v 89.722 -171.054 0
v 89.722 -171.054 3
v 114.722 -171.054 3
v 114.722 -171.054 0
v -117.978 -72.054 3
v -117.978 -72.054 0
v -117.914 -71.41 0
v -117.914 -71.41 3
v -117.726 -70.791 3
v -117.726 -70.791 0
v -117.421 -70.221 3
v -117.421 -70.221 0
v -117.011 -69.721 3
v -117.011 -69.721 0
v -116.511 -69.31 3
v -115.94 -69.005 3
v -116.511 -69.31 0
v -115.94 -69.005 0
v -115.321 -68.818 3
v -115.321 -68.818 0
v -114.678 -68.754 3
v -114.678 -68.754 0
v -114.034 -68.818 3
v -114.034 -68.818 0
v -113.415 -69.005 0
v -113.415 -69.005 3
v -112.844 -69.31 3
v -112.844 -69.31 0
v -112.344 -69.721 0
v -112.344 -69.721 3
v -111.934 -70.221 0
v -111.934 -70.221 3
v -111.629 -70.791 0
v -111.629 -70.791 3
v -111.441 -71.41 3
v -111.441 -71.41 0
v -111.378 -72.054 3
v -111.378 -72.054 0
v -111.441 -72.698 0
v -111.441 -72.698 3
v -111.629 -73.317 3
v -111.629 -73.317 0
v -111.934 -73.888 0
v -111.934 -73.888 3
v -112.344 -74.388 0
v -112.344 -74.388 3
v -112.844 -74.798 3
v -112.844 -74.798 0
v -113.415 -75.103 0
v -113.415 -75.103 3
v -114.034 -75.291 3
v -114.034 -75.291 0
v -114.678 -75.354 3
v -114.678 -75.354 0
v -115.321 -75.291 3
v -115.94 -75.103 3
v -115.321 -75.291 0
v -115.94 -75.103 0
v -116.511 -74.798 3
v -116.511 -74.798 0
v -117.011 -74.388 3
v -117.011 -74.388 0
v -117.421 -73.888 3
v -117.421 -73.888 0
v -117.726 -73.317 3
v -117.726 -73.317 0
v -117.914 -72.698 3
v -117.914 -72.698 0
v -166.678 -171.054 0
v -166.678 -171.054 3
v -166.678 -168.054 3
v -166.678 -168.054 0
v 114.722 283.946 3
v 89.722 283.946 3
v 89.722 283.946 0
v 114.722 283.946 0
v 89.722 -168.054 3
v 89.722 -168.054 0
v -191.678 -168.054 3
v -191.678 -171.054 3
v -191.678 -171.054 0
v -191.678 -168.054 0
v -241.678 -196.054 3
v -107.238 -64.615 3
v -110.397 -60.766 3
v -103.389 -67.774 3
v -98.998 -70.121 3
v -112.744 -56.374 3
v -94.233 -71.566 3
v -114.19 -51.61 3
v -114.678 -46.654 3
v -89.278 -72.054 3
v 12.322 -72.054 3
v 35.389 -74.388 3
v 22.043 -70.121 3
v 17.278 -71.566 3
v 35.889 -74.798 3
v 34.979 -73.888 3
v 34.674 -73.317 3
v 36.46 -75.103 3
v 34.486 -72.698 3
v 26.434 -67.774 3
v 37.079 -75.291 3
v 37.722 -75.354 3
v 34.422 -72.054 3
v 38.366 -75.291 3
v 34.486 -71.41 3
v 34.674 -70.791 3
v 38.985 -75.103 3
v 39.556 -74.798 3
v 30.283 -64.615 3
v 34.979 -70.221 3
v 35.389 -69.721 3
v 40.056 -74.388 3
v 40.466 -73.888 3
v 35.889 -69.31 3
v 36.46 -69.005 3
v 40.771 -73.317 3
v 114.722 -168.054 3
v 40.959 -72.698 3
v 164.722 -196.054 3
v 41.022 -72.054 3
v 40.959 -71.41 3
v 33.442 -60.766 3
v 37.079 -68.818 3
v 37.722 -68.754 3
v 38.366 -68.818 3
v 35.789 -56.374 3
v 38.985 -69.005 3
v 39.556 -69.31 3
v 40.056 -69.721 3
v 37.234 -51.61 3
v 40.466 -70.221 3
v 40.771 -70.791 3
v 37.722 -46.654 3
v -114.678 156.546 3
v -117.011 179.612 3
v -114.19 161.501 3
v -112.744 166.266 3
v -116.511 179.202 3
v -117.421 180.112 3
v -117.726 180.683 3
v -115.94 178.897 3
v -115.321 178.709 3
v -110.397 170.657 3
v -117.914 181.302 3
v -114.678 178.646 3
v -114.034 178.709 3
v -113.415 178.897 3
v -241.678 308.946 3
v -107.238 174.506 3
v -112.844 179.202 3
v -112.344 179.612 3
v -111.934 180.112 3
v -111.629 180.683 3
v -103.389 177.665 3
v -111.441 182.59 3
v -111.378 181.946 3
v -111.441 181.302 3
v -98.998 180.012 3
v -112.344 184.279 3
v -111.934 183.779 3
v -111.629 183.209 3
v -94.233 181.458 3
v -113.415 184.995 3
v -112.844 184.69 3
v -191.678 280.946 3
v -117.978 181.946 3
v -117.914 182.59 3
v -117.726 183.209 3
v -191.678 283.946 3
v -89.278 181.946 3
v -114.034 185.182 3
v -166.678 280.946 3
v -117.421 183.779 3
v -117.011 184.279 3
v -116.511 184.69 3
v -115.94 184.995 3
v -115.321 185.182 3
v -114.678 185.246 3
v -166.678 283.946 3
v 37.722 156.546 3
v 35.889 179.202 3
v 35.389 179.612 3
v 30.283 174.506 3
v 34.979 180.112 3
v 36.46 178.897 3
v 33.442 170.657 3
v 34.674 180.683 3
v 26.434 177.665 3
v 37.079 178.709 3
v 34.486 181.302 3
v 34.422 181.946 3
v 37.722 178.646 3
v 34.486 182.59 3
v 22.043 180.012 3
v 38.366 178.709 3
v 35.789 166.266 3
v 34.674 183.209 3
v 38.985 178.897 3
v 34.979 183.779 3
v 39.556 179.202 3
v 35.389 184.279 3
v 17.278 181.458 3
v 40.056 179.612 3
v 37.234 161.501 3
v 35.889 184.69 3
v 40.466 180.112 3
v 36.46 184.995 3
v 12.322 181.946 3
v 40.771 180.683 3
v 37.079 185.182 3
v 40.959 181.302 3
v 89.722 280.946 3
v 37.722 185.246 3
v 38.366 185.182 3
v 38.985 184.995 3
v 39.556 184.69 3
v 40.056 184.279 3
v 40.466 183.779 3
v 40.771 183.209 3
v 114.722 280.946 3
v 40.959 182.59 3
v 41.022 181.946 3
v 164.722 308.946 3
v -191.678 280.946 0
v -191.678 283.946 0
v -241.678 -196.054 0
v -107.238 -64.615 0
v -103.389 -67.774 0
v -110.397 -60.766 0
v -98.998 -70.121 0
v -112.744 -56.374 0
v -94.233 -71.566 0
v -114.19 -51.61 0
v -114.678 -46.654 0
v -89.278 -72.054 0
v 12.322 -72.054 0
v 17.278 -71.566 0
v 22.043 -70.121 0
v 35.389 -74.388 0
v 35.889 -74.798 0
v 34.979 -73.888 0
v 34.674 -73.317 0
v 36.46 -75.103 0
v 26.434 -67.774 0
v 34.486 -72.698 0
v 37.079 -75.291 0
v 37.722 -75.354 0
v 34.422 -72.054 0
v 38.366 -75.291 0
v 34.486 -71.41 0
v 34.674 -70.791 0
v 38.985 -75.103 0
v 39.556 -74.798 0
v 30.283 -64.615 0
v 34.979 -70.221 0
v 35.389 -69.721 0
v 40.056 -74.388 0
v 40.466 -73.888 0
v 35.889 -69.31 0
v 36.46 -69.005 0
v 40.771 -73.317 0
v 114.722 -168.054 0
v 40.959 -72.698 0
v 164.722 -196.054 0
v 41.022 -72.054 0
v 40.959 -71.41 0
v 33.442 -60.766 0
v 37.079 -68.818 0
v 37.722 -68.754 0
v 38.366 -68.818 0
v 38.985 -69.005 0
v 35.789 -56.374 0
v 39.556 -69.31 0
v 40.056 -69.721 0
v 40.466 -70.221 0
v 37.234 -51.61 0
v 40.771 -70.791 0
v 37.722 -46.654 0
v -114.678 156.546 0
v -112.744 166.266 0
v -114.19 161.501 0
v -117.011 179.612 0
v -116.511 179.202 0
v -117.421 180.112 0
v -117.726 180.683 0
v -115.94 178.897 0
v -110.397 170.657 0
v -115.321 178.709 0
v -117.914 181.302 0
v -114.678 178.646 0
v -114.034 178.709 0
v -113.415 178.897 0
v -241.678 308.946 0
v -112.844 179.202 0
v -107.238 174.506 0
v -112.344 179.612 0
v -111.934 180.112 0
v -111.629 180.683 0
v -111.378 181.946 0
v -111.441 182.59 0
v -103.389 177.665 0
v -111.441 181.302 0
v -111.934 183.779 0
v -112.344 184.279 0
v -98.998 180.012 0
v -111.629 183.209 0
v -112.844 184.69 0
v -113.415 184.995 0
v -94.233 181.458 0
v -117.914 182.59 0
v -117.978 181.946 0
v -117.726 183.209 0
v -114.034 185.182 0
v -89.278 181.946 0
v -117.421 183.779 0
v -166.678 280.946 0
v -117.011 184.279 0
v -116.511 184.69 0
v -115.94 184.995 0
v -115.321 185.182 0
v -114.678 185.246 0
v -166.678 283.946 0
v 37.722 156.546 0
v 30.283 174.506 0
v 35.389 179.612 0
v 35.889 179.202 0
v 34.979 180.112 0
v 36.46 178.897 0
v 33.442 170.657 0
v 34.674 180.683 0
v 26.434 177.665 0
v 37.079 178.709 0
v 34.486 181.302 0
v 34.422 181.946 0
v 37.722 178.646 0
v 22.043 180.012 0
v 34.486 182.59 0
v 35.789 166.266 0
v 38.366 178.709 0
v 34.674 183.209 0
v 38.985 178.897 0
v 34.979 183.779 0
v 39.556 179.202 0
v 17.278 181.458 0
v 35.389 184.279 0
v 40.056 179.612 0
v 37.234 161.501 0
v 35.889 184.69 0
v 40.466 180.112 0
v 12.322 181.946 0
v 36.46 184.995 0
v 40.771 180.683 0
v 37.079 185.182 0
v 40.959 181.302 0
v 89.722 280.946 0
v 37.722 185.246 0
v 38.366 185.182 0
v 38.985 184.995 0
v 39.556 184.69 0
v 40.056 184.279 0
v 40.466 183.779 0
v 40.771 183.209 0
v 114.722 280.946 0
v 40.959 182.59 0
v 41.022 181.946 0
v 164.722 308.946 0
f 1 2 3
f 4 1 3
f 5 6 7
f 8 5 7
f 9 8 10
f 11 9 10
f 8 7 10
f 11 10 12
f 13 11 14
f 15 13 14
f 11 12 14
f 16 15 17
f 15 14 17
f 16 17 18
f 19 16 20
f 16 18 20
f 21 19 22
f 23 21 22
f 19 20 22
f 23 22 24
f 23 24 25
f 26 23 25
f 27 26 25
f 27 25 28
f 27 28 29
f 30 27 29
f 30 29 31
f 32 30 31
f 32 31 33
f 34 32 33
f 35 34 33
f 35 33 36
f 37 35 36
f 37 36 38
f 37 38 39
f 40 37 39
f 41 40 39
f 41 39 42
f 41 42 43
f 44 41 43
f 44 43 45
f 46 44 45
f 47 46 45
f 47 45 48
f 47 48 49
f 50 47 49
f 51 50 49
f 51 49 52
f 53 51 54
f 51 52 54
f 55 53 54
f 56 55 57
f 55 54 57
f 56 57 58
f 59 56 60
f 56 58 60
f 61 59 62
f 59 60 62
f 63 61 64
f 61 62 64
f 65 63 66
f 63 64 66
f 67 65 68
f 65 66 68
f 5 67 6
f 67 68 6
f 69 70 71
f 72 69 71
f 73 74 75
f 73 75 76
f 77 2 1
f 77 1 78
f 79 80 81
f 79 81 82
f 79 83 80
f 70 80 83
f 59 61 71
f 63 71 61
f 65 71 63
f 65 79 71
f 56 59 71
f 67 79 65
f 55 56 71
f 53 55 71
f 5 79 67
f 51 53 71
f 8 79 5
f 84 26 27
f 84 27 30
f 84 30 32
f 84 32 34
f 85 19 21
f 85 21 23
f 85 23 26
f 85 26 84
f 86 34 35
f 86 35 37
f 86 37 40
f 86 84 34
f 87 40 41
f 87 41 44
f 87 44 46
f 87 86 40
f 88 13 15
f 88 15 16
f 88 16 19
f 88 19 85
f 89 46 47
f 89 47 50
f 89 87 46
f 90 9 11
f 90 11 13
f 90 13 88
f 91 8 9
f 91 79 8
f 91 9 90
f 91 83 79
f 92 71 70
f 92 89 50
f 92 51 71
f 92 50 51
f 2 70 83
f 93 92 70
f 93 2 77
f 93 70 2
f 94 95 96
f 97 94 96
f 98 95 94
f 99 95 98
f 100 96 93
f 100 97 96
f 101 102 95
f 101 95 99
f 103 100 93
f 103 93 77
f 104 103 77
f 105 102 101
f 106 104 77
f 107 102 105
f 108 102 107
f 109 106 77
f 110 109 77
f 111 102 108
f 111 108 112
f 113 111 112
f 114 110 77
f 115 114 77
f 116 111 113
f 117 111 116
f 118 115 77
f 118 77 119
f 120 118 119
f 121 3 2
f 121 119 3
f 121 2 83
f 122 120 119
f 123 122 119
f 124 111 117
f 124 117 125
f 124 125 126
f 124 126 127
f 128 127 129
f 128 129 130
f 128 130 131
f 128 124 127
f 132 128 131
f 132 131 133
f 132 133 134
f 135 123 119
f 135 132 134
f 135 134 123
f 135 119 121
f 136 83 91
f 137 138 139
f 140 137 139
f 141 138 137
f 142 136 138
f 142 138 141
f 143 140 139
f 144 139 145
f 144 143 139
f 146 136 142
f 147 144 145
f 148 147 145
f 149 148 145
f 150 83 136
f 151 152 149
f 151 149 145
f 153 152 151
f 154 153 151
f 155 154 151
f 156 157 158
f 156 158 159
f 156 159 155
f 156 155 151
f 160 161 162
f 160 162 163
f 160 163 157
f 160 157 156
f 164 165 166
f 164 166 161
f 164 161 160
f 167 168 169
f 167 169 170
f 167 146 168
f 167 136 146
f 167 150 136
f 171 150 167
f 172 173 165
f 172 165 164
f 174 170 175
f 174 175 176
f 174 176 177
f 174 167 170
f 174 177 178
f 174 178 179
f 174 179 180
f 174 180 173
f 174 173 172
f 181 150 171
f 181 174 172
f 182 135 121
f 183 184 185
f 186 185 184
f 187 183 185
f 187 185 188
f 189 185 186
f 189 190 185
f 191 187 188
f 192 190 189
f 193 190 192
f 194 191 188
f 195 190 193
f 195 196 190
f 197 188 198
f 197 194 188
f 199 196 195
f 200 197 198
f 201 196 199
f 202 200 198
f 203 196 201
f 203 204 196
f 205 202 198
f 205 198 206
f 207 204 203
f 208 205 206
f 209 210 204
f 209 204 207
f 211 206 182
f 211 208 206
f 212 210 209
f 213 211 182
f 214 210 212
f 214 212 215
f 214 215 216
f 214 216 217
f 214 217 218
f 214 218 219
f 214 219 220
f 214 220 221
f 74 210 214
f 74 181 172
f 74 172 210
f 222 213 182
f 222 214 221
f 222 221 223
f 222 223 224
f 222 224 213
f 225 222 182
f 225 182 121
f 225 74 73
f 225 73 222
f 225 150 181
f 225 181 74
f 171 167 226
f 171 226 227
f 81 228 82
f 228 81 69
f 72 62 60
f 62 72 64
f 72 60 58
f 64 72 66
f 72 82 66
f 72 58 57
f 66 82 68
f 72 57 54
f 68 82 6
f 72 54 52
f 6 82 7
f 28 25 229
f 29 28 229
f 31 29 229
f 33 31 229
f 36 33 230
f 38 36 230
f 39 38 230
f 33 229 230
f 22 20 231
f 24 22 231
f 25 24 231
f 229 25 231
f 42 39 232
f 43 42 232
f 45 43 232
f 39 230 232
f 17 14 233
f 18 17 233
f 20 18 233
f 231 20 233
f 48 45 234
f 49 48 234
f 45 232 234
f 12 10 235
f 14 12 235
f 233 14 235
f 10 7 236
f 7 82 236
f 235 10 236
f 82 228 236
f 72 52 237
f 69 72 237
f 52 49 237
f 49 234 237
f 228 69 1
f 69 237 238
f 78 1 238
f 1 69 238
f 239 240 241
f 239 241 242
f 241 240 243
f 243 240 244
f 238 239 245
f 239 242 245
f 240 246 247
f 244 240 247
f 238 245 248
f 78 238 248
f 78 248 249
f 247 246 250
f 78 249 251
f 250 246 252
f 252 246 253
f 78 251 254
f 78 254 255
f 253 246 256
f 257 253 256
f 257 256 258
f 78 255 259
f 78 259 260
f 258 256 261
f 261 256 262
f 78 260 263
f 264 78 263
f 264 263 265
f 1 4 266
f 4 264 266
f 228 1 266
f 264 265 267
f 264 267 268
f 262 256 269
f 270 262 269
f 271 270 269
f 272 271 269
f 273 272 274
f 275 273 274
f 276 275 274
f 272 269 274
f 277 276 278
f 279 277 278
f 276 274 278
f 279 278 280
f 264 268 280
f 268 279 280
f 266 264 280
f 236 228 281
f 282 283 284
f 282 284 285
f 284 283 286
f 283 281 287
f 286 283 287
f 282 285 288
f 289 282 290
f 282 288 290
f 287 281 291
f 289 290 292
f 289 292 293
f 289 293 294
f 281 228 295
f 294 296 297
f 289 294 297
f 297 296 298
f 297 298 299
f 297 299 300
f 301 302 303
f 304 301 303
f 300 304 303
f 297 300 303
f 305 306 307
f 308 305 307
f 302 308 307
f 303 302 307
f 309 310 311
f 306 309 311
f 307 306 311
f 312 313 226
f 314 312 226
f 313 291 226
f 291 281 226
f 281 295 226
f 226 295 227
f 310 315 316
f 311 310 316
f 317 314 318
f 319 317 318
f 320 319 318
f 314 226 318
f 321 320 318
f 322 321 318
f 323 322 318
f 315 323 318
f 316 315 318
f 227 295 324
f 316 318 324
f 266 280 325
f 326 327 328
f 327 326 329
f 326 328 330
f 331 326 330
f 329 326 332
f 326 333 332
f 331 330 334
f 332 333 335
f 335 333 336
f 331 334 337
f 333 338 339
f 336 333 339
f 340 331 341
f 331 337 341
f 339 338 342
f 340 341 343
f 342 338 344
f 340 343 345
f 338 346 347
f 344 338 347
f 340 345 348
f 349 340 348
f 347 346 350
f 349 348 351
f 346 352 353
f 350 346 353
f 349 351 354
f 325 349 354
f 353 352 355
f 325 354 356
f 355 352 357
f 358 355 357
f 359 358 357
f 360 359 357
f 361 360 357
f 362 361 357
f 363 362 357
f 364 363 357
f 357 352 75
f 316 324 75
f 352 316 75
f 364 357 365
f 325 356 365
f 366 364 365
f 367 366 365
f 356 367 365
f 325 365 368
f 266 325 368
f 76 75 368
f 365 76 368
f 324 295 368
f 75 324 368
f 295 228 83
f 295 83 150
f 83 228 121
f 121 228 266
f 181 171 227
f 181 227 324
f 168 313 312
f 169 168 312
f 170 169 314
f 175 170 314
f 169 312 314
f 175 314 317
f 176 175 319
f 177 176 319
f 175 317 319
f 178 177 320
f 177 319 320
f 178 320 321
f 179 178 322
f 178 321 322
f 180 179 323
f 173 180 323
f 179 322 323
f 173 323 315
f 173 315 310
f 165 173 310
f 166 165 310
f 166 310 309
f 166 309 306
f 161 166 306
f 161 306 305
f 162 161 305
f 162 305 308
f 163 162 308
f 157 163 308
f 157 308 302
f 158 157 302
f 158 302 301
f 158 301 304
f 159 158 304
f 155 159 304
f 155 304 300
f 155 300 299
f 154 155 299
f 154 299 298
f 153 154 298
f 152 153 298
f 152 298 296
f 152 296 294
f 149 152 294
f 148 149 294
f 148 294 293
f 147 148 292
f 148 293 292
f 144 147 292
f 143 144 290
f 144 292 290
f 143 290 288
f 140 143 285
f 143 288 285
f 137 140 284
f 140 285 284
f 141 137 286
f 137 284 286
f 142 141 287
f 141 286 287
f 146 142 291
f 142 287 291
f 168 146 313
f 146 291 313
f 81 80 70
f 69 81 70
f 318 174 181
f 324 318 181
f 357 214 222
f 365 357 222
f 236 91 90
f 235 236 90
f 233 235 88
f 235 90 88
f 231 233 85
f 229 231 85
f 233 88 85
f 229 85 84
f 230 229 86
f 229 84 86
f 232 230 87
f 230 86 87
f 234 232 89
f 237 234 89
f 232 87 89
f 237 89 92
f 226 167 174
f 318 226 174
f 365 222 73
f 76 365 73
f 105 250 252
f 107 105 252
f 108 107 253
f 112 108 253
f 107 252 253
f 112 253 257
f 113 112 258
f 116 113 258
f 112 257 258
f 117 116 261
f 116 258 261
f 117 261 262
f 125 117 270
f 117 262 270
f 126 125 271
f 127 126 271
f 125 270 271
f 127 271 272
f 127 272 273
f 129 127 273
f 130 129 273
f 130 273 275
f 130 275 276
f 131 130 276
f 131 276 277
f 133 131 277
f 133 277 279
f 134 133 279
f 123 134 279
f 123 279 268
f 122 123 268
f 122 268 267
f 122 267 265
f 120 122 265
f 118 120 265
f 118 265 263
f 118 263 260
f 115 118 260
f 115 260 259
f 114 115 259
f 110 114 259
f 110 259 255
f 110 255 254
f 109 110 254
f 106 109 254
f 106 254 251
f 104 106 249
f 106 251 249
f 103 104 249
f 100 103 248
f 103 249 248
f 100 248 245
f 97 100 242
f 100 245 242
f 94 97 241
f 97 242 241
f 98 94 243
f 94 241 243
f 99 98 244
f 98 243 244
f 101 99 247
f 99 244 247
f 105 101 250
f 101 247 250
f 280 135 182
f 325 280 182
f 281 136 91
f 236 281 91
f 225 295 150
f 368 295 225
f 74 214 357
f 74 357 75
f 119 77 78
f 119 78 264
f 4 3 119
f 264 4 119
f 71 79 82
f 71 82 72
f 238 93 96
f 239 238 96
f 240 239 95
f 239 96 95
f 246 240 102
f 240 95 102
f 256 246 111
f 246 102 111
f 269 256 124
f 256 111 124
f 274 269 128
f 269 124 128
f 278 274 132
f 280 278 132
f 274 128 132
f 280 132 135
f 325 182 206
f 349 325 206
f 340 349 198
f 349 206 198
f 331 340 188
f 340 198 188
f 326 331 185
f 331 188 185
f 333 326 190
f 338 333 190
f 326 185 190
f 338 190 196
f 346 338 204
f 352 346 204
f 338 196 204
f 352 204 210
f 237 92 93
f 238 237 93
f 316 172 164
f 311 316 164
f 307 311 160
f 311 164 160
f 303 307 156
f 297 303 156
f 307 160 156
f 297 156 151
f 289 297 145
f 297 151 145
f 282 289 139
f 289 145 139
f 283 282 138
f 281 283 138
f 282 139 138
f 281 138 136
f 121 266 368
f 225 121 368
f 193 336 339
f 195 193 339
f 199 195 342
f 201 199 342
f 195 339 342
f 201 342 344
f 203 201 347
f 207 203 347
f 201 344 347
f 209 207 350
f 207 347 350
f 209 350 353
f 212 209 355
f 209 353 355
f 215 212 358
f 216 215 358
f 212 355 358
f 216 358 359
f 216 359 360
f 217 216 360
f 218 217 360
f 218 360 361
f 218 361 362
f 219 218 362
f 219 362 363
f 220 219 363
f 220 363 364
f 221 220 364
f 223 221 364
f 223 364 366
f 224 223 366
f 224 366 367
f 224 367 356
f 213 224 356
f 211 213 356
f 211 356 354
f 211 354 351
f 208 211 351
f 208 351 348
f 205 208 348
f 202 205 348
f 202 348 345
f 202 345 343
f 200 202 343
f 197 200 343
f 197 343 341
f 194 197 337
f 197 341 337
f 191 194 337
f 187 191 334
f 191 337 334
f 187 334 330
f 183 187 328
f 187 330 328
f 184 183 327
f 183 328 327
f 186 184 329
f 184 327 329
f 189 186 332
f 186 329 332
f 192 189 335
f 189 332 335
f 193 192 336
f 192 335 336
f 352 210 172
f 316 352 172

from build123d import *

# Parameters (mm, degrees)
F0_W     = 406.4
F0_H     = 505
F1_DEPTH = 3
F3_D     = 6.6
F4_DEPTH = 25
F5_W     = 25
F5_H     = 3
F6_DEPTH = 25


with BuildPart() as f1:
    # F0 (on Top) → F1 (new body)
    with BuildSketch(Plane.XY):
        with Locations((-38.4776114106, 56.445750549)):
            Rectangle(F0_W, F0_H)
    extrude(amount=F1_DEPTH)

    # F3 (through all)
    with Locations(Plane.XY.offset(3)):
        with Locations((-114.6776114106, 181.945750549), (37.7223885894, 181.945750549), (37.7223885894, -72.054249451), (-114.6776114106, -72.054249451)):
            Hole(F3_D / 2)

    # F2 (on face) → F4 (cut)
    with BuildSketch(Plane.XY.offset(3)):
        with BuildLine():
            Line((12.3223885894, 181.945750549), (-89.2776114106, 181.945750549))
            ThreePointArc((-89.2776114106, 181.945750549), (-107.2381236528, 174.5062627912), (-114.6776114106, 156.545750549))
            Line((-114.6776114106, 156.545750549), (-114.6776114106, -46.654249451))
            ThreePointArc((-114.6776114106, -46.654249451), (-107.2381236528, -64.6147616931), (-89.2776114106, -72.054249451))
            Line((-89.2776114106, -72.054249451), (12.3223885894, -72.054249451))
            ThreePointArc((12.3223885894, -72.054249451), (30.2829008315, -64.6147616931), (37.7223885894, -46.654249451))
            Line((37.7223885894, -46.654249451), (37.7223885894, 156.545750549))
            ThreePointArc((37.7223885894, 156.545750549), (30.2829008315, 174.5062627912), (12.3223885894, 181.945750549))
        make_face()
    extrude(amount=-F4_DEPTH, mode=Mode.SUBTRACT)

    # F5 (on face) → F6 (cut)
    with BuildSketch(Plane.XY.offset(3)):
        with Locations((-179.1776114106, 282.445750549)):
            Rectangle(F5_W, F5_H)
        with Locations((102.2223885894, 282.445750549)):
            Rectangle(F5_W, F5_H)
        with Locations((102.2223885894, -169.554249451)):
            Rectangle(F5_W, F5_H)
        with Locations((-179.1776114106, -169.554249451)):
            Rectangle(F5_W, F5_H)
    extrude(amount=-F6_DEPTH, mode=Mode.SUBTRACT)


solid = f1.part
